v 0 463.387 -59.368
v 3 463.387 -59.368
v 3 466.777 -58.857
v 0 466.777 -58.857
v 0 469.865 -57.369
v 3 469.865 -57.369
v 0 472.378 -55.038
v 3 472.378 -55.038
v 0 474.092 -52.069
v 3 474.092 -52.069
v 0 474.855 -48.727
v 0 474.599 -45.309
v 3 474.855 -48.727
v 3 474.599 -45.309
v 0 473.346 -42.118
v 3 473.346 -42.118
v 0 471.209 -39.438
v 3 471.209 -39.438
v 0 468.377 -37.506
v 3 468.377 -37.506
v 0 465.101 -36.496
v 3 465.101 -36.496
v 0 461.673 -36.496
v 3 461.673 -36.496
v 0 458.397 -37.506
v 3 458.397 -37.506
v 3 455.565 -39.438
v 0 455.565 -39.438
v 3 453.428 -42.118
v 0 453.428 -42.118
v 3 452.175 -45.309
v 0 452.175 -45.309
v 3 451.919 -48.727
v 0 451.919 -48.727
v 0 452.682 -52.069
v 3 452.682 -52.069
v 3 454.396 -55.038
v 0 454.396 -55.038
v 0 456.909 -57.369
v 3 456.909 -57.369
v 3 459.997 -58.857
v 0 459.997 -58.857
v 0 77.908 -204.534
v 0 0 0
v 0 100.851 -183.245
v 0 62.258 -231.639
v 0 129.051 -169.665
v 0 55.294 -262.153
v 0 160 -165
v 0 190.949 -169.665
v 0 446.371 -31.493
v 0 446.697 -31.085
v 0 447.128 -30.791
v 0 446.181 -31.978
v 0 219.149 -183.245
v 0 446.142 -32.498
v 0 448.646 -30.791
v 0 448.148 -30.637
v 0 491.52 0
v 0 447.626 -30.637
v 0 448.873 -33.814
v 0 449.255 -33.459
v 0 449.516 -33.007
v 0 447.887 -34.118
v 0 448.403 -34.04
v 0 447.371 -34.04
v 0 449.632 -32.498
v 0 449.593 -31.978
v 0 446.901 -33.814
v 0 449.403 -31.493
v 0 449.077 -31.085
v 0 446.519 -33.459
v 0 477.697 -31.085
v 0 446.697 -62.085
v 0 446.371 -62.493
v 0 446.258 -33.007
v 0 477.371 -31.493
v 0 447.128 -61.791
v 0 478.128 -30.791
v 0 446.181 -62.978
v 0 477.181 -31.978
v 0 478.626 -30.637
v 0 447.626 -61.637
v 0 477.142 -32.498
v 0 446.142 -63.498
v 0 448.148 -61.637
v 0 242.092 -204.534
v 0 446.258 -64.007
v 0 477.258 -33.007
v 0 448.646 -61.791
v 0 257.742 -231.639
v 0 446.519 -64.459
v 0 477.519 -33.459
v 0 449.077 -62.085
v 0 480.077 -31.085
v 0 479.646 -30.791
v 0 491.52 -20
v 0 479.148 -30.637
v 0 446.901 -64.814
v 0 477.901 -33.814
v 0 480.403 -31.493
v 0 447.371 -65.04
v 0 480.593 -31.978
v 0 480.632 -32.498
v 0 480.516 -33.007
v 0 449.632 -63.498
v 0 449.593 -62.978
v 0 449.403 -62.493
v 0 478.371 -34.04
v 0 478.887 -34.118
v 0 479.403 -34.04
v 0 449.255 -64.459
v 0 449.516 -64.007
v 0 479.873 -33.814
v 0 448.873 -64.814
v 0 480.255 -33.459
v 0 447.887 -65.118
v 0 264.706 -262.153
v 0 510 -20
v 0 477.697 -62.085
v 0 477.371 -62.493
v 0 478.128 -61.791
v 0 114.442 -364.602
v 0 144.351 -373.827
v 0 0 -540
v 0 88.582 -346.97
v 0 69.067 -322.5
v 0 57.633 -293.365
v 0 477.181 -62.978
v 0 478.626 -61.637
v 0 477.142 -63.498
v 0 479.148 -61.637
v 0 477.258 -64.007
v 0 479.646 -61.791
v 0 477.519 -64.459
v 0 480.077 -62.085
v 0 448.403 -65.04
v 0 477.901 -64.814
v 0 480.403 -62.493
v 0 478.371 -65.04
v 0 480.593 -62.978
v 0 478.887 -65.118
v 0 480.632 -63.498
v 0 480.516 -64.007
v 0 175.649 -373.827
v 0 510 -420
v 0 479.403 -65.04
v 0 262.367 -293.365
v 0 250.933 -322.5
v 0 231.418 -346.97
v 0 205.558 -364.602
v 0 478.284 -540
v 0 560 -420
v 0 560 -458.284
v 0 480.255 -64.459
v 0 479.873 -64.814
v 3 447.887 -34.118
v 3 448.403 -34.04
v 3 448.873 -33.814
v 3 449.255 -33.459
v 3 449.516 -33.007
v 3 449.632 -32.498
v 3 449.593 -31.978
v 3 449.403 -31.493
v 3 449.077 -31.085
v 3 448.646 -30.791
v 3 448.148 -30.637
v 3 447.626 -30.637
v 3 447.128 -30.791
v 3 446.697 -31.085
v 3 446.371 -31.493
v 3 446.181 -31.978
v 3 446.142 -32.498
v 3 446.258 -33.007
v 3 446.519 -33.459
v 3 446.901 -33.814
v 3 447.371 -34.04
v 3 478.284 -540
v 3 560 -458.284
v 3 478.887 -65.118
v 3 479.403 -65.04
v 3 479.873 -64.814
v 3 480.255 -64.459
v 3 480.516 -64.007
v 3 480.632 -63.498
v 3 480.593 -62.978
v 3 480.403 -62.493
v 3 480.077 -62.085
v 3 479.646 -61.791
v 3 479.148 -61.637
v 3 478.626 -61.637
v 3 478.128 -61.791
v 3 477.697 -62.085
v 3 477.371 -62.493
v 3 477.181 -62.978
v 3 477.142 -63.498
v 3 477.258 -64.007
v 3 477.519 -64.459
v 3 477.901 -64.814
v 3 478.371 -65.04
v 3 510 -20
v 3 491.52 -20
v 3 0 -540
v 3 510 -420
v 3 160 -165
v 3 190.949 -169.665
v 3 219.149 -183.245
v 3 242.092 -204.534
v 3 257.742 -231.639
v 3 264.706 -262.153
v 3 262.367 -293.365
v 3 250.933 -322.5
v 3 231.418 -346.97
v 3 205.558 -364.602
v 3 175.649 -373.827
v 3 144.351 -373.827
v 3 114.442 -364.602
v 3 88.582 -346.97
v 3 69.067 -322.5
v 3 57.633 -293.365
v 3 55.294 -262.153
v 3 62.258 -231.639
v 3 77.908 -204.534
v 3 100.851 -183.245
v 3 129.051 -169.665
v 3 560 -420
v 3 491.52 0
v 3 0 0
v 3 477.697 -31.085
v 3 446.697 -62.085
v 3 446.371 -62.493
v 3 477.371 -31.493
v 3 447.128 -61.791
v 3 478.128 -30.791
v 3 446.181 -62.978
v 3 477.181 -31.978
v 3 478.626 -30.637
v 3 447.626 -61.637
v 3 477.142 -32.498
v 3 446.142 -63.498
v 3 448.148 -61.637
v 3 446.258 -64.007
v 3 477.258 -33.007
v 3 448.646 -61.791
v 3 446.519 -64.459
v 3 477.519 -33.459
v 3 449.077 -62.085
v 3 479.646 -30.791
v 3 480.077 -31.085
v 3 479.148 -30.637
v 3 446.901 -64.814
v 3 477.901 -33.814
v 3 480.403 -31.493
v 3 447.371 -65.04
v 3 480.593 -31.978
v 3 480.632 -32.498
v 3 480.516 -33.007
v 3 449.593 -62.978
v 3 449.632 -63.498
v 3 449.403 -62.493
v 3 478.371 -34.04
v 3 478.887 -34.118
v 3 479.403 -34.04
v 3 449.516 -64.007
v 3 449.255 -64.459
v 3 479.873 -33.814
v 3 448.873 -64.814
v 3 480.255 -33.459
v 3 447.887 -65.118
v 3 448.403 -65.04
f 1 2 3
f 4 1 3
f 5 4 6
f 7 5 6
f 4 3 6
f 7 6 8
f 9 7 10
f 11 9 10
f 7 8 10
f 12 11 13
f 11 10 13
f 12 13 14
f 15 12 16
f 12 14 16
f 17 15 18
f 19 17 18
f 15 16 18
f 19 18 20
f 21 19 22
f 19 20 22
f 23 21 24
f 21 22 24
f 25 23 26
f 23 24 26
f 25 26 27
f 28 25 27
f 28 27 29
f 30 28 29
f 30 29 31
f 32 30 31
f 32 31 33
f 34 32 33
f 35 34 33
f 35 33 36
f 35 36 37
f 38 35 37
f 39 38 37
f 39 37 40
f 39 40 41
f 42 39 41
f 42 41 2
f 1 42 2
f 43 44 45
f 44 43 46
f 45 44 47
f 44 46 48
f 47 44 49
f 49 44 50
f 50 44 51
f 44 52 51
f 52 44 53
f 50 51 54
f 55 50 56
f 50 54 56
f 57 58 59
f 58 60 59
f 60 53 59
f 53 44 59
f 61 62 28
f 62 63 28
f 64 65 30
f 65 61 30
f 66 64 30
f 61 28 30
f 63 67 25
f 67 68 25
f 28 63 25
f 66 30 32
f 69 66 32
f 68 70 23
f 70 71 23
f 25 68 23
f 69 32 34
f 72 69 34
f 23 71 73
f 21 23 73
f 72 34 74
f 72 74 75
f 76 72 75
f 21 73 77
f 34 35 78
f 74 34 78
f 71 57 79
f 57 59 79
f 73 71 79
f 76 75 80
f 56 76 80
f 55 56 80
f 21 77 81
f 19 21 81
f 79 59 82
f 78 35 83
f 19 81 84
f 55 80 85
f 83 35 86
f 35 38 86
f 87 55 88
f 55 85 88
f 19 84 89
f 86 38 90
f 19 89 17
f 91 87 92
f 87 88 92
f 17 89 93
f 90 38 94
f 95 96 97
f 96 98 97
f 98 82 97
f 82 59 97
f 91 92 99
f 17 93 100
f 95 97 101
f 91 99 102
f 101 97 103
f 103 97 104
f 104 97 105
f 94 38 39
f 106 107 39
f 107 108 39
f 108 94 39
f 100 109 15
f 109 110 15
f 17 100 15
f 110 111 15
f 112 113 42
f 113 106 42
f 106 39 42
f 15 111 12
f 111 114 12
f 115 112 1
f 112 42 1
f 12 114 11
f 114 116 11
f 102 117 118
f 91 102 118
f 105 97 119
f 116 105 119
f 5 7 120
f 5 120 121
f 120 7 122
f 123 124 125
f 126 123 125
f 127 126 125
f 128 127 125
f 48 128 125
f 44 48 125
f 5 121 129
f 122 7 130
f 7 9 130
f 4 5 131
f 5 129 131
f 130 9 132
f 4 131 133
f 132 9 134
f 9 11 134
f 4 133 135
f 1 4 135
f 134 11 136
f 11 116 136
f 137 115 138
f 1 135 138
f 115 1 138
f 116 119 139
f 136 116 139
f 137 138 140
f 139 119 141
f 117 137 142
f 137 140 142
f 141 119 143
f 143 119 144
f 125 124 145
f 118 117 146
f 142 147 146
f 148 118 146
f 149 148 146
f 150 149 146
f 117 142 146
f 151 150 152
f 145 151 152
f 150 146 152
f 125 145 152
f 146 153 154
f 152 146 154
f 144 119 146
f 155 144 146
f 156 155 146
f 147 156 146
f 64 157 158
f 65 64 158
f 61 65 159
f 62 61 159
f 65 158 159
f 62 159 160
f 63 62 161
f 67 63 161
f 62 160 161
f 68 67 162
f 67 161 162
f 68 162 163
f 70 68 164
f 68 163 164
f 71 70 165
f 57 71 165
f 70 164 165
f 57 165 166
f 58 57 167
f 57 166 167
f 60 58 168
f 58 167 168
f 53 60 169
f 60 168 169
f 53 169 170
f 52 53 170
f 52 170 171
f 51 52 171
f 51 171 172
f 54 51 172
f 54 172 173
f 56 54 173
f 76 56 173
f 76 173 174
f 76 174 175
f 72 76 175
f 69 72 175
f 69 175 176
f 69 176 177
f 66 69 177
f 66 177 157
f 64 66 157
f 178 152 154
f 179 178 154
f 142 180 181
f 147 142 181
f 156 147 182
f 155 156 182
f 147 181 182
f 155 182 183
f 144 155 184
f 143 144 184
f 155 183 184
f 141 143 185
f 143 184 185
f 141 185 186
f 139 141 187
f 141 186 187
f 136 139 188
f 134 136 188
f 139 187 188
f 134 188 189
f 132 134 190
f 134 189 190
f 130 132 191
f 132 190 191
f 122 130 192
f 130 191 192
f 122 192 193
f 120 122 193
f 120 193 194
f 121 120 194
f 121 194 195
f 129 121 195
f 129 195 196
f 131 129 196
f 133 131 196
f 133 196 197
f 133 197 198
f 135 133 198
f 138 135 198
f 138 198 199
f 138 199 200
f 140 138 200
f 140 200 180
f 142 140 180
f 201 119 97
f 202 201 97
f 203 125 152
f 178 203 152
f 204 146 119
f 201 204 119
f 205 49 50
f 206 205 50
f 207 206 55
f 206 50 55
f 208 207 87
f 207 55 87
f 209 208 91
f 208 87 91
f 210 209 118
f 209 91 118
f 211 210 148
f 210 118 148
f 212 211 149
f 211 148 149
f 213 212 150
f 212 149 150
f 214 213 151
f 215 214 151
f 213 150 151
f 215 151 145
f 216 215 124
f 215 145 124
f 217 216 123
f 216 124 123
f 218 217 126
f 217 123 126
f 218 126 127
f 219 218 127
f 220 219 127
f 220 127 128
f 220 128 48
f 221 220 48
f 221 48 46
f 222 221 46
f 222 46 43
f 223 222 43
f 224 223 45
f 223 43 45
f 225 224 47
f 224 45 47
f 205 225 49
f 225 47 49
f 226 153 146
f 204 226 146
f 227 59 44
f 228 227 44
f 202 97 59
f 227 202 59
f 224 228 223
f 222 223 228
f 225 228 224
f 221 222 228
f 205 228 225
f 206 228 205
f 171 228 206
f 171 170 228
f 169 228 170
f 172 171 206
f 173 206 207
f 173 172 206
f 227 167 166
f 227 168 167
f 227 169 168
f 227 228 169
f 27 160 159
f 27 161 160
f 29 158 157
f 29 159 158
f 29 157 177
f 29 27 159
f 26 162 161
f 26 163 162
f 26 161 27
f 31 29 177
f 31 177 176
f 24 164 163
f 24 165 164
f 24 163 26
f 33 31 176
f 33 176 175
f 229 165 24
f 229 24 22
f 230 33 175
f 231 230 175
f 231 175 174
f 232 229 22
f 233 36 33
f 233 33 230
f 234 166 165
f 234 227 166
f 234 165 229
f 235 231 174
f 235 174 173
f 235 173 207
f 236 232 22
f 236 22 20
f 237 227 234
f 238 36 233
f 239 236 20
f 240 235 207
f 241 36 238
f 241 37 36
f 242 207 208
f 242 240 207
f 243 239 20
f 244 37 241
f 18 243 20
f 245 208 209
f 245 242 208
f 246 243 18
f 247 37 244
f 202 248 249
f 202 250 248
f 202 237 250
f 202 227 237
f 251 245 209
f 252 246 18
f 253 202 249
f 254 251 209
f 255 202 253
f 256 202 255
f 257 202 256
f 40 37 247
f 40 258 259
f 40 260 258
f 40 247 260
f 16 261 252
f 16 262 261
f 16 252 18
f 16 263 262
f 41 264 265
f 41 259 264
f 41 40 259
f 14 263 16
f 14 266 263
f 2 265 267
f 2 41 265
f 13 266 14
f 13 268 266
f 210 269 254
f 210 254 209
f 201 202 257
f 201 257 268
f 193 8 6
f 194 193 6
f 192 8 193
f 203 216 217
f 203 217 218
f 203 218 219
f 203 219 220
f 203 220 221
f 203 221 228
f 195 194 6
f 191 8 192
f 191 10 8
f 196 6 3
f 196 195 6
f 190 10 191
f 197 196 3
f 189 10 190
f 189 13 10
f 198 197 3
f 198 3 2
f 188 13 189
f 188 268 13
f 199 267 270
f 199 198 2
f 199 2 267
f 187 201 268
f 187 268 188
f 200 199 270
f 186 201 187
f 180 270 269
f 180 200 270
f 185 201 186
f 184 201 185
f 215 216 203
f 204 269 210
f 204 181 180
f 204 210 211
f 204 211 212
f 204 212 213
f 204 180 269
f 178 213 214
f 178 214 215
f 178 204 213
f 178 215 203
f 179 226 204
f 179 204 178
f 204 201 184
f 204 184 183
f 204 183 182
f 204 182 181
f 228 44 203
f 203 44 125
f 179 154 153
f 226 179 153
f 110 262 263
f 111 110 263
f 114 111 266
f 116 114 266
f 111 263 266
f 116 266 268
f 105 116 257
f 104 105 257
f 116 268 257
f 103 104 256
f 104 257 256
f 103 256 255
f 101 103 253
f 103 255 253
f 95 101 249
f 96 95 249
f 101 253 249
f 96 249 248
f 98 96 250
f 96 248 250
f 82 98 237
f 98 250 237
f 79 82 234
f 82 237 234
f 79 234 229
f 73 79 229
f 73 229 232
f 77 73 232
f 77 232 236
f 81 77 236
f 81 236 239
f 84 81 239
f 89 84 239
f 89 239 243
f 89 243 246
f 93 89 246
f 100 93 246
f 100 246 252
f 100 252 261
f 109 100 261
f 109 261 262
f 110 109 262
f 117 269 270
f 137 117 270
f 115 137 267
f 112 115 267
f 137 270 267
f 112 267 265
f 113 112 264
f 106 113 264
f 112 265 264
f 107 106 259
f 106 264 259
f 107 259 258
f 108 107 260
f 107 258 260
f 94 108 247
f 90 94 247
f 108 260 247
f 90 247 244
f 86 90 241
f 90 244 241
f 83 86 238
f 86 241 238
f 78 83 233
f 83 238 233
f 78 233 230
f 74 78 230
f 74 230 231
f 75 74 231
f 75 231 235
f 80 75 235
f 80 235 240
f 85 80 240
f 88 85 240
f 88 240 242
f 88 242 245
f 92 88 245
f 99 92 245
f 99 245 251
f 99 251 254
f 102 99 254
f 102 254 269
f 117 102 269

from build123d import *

# Parameters (mm, degrees)
BOSS_EXTRUDE1_DEPTH = 3
SKETCH3_R           = 105
CUT_EXTRUDE1_DEPTH  = 3
SKETCH4_R           = 1.75
SKETCH4_R_2         = 11.5
CUT_EXTRUDE2_DEPTH  = 15


with BuildPart() as part:
    # Sketch1 → Boss-Extrude1 (new body)
    with BuildSketch(Plane(origin=(0, 0, 0), x_dir=(0, 0, -1), z_dir=(1, 0, 0))):
        Polygon((540, 475.629480553), (540, 478.284271247), (458.284271247, 560), (420, 560), (420, 510), (20, 510), (20, 491.519731167), (0, 491.519731167), (0, 475.629480553), (0, 0), (540, 0), align=None)
    extrude(amount=BOSS_EXTRUDE1_DEPTH)

    # Sketch3 → Cut-Extrude1 (cut)
    with BuildSketch(Plane.ZY):
        with Locations((-270, 160)):
            Circle(SKETCH3_R)
    extrude(amount=-CUT_EXTRUDE1_DEPTH, mode=Mode.SUBTRACT)

    # Sketch4 → Cut-Extrude2 (cut)
    with BuildSketch(Plane(origin=(3, 0, 0), x_dir=(0, 0, -1), z_dir=(1, 0, 0))):
        with Locations((32.367626301, 478.88695563)):
            Circle(SKETCH4_R)
        with Locations((32.367626301, 447.88695563)):
            Circle(SKETCH4_R)
        with Locations((63.367626301, 447.88695563)):
            Circle(SKETCH4_R)
        with Locations((63.367626301, 478.88695563)):
            Circle(SKETCH4_R)
        with Locations((47.867626301, 463.38695563)):
            Circle(SKETCH4_R_2)
    extrude(amount=-CUT_EXTRUDE2_DEPTH, mode=Mode.SUBTRACT)


solid = part.part
